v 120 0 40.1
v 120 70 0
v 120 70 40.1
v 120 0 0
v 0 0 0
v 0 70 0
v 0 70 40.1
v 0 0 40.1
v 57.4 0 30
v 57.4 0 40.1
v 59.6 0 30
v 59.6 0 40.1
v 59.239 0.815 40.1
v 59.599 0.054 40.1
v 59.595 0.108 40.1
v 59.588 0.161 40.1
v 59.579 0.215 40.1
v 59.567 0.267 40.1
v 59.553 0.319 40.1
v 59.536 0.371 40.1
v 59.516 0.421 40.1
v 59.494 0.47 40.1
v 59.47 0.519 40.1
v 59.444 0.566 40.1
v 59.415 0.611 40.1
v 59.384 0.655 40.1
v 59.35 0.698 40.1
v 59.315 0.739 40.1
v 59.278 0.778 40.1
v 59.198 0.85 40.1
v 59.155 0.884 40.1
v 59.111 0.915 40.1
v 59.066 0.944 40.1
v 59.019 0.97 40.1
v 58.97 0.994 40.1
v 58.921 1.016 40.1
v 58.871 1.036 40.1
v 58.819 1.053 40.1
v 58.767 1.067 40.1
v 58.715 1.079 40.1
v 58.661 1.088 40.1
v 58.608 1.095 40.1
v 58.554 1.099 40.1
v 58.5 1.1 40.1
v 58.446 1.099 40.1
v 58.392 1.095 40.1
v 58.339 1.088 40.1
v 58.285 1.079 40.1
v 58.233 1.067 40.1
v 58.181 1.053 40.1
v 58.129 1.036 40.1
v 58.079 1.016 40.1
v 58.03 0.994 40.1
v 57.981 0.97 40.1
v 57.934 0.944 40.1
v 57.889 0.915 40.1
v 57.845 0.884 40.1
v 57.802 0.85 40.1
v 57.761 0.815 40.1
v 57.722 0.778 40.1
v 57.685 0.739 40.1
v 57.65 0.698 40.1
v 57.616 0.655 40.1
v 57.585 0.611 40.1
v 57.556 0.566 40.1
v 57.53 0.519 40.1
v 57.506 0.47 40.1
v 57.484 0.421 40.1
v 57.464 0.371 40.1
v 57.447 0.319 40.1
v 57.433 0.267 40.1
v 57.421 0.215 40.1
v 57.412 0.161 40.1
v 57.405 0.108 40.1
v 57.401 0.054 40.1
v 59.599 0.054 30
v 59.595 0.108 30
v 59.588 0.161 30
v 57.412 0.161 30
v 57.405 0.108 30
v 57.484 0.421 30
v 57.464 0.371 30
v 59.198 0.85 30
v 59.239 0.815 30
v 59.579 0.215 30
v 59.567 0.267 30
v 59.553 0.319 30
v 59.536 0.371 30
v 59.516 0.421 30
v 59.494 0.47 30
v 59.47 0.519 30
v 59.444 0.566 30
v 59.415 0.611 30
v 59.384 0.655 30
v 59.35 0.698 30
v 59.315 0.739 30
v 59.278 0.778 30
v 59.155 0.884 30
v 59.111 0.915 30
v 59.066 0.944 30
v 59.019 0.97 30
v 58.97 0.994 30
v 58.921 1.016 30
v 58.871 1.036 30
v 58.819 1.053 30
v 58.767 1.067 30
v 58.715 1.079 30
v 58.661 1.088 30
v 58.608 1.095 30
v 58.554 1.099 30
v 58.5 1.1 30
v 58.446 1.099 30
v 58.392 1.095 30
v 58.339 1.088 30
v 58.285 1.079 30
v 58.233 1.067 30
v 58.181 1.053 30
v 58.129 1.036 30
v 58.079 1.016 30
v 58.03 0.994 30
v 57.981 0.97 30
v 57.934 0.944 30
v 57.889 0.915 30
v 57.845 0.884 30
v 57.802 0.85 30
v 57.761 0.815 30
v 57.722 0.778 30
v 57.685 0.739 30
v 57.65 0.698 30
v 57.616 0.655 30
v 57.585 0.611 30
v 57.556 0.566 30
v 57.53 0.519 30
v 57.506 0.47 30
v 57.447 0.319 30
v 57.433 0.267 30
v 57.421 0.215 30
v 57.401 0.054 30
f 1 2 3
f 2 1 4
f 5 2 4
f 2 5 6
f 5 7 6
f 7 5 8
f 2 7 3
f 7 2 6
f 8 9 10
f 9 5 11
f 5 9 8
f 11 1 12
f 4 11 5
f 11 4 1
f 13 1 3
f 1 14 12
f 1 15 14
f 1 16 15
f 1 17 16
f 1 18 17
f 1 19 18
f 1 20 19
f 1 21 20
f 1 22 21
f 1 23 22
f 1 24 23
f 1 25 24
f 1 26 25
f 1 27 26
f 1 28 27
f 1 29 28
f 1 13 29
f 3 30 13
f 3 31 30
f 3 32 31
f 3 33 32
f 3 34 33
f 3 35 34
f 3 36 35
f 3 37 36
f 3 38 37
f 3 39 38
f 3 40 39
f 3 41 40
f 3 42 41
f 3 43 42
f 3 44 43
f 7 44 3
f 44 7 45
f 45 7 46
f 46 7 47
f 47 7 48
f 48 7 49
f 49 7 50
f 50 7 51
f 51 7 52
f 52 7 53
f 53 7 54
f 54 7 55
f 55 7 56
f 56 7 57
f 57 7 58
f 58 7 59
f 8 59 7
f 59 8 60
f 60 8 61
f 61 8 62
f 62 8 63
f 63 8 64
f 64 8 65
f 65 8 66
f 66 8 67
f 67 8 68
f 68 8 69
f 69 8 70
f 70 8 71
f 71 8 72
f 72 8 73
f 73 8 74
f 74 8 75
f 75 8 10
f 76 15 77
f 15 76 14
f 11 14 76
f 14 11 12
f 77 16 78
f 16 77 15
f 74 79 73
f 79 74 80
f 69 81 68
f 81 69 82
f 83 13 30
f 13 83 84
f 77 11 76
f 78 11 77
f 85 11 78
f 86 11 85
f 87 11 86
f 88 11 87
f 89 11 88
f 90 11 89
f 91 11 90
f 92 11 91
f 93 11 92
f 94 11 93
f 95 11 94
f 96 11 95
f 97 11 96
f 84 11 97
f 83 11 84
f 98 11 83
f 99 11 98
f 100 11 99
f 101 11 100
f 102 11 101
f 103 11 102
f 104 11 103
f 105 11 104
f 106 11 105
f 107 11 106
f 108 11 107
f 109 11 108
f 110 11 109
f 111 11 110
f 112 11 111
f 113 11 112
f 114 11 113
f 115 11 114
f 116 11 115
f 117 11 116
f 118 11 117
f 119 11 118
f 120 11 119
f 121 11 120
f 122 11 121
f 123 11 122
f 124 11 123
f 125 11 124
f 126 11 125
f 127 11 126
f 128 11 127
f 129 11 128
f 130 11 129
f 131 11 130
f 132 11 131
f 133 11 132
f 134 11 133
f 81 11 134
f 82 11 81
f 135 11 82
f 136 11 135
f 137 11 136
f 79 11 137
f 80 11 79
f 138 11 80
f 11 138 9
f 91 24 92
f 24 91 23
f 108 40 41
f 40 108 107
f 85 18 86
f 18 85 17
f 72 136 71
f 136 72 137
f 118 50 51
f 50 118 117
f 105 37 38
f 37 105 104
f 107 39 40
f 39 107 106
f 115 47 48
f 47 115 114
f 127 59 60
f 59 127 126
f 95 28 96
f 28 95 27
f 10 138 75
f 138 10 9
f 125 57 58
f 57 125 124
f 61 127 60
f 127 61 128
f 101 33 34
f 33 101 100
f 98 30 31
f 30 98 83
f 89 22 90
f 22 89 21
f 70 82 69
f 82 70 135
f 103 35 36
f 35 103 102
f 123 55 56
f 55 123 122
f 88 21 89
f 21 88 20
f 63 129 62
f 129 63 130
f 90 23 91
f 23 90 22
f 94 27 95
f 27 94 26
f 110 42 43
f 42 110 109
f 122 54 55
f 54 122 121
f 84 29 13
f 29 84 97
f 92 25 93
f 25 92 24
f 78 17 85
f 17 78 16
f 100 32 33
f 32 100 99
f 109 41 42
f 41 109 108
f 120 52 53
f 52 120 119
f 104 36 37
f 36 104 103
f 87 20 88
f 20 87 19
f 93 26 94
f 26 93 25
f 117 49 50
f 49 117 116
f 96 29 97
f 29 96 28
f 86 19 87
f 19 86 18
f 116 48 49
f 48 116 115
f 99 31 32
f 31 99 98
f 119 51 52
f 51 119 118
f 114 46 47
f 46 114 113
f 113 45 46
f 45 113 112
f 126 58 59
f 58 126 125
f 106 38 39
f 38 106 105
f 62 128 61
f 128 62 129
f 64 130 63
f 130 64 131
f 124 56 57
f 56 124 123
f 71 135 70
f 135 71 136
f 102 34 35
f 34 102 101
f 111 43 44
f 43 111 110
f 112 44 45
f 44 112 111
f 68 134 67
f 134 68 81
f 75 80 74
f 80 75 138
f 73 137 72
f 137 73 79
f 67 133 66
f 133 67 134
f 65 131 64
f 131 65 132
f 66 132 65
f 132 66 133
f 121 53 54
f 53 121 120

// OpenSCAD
// Buffer Tank for Mini Horizontal Gel Electrophoresis
// Units: millimetres

// Outer Dimensions
$w_outer = 120; // Width (X)
$d_outer = 70;  // Depth (Y)
$h_outer = 40;  // Height (Z)

// Wall and Floor Thickness
$wall_thick = 3;
$floor_thick = 3;

// Platform Dimensions
$plat_len = 60;   // Length in X
$plat_width = $d_outer; // Spans full inner width (Y)
$plat_height = 10; // Height above inner floor

// Hole Dimensions
$hole_dia = 2;
$hole_y = 0;
$hole_z = 30;

// Configuration
$fn = 128; // High resolution for smooth curves

// Derived Dimensions
$inner_w = $w_outer - 2*$wall_thick;
$inner_d = $d_outer - 2*$wall_thick;
$inner_h = $h_outer - $floor_thick;
$inner_floor_z = $floor_thick;

// Helper function to create the main tank shell
module tank_shell() {
    translate([0, 0, 0]) {
        // Main block
        cube([
            $w_outer, 
            $d_outer, 
            $h_outer
        ]);
        
        // Cut out the top (open tank)
        translate([0, 0, $h_outer - $wall_thick]) {
            cube([
                $w_outer, 
                $d_outer, 
                $wall_thick + 0.1 // Extend slightly past top face
            ]);
        }
        
        // Cut out the floor
        translate([0, 0, 0]) {
            cube([
                $w_outer, 
                $d_outer, 
                $floor_thick + 0.1 // Extend slightly past bottom face
            ]);
        }
    }
}

// Helper function to create the raised platform
module platform() {
    translate([
        ($w_outer - $plat_len) / 2, // Center in X
        0, // Center in Y (aligned with hole axis)
        $inner_floor_z + $plat_height // Position on inner floor
    ]) {
        cube([
            $plat_len,
            $plat_width,
            $plat_height
        ]);
    }
}

// Helper function to drill horizontal holes
module drill_holes() {
    // Left end wall hole
    translate([
        -$w_outer/2 + $wall_thick/2, // Position at left inner wall
        $hole_y,
        $hole_z
    ]) {
        cylinder(
            h = $w_outer - 2*$wall_thick + 0.1, // Extend through wall
            r = $hole_dia/2 + 0.1,
            $fn = $fn
        );
    }
    
    // Right end wall hole
    translate([
        $w_outer/2 - $wall_thick/2, // Position at right inner wall
        $hole_y,
        $hole_z
    ]) {
        cylinder(
            h = $w_outer - 2*$wall_thick + 0.1, // Extend through wall
            r = $hole_dia/2 + 0.1,
            $fn = $fn
        );
    }
}

// Main assembly
difference() {
    union() {
        tank_shell();
        platform();
    }
    drill_holes();
}
